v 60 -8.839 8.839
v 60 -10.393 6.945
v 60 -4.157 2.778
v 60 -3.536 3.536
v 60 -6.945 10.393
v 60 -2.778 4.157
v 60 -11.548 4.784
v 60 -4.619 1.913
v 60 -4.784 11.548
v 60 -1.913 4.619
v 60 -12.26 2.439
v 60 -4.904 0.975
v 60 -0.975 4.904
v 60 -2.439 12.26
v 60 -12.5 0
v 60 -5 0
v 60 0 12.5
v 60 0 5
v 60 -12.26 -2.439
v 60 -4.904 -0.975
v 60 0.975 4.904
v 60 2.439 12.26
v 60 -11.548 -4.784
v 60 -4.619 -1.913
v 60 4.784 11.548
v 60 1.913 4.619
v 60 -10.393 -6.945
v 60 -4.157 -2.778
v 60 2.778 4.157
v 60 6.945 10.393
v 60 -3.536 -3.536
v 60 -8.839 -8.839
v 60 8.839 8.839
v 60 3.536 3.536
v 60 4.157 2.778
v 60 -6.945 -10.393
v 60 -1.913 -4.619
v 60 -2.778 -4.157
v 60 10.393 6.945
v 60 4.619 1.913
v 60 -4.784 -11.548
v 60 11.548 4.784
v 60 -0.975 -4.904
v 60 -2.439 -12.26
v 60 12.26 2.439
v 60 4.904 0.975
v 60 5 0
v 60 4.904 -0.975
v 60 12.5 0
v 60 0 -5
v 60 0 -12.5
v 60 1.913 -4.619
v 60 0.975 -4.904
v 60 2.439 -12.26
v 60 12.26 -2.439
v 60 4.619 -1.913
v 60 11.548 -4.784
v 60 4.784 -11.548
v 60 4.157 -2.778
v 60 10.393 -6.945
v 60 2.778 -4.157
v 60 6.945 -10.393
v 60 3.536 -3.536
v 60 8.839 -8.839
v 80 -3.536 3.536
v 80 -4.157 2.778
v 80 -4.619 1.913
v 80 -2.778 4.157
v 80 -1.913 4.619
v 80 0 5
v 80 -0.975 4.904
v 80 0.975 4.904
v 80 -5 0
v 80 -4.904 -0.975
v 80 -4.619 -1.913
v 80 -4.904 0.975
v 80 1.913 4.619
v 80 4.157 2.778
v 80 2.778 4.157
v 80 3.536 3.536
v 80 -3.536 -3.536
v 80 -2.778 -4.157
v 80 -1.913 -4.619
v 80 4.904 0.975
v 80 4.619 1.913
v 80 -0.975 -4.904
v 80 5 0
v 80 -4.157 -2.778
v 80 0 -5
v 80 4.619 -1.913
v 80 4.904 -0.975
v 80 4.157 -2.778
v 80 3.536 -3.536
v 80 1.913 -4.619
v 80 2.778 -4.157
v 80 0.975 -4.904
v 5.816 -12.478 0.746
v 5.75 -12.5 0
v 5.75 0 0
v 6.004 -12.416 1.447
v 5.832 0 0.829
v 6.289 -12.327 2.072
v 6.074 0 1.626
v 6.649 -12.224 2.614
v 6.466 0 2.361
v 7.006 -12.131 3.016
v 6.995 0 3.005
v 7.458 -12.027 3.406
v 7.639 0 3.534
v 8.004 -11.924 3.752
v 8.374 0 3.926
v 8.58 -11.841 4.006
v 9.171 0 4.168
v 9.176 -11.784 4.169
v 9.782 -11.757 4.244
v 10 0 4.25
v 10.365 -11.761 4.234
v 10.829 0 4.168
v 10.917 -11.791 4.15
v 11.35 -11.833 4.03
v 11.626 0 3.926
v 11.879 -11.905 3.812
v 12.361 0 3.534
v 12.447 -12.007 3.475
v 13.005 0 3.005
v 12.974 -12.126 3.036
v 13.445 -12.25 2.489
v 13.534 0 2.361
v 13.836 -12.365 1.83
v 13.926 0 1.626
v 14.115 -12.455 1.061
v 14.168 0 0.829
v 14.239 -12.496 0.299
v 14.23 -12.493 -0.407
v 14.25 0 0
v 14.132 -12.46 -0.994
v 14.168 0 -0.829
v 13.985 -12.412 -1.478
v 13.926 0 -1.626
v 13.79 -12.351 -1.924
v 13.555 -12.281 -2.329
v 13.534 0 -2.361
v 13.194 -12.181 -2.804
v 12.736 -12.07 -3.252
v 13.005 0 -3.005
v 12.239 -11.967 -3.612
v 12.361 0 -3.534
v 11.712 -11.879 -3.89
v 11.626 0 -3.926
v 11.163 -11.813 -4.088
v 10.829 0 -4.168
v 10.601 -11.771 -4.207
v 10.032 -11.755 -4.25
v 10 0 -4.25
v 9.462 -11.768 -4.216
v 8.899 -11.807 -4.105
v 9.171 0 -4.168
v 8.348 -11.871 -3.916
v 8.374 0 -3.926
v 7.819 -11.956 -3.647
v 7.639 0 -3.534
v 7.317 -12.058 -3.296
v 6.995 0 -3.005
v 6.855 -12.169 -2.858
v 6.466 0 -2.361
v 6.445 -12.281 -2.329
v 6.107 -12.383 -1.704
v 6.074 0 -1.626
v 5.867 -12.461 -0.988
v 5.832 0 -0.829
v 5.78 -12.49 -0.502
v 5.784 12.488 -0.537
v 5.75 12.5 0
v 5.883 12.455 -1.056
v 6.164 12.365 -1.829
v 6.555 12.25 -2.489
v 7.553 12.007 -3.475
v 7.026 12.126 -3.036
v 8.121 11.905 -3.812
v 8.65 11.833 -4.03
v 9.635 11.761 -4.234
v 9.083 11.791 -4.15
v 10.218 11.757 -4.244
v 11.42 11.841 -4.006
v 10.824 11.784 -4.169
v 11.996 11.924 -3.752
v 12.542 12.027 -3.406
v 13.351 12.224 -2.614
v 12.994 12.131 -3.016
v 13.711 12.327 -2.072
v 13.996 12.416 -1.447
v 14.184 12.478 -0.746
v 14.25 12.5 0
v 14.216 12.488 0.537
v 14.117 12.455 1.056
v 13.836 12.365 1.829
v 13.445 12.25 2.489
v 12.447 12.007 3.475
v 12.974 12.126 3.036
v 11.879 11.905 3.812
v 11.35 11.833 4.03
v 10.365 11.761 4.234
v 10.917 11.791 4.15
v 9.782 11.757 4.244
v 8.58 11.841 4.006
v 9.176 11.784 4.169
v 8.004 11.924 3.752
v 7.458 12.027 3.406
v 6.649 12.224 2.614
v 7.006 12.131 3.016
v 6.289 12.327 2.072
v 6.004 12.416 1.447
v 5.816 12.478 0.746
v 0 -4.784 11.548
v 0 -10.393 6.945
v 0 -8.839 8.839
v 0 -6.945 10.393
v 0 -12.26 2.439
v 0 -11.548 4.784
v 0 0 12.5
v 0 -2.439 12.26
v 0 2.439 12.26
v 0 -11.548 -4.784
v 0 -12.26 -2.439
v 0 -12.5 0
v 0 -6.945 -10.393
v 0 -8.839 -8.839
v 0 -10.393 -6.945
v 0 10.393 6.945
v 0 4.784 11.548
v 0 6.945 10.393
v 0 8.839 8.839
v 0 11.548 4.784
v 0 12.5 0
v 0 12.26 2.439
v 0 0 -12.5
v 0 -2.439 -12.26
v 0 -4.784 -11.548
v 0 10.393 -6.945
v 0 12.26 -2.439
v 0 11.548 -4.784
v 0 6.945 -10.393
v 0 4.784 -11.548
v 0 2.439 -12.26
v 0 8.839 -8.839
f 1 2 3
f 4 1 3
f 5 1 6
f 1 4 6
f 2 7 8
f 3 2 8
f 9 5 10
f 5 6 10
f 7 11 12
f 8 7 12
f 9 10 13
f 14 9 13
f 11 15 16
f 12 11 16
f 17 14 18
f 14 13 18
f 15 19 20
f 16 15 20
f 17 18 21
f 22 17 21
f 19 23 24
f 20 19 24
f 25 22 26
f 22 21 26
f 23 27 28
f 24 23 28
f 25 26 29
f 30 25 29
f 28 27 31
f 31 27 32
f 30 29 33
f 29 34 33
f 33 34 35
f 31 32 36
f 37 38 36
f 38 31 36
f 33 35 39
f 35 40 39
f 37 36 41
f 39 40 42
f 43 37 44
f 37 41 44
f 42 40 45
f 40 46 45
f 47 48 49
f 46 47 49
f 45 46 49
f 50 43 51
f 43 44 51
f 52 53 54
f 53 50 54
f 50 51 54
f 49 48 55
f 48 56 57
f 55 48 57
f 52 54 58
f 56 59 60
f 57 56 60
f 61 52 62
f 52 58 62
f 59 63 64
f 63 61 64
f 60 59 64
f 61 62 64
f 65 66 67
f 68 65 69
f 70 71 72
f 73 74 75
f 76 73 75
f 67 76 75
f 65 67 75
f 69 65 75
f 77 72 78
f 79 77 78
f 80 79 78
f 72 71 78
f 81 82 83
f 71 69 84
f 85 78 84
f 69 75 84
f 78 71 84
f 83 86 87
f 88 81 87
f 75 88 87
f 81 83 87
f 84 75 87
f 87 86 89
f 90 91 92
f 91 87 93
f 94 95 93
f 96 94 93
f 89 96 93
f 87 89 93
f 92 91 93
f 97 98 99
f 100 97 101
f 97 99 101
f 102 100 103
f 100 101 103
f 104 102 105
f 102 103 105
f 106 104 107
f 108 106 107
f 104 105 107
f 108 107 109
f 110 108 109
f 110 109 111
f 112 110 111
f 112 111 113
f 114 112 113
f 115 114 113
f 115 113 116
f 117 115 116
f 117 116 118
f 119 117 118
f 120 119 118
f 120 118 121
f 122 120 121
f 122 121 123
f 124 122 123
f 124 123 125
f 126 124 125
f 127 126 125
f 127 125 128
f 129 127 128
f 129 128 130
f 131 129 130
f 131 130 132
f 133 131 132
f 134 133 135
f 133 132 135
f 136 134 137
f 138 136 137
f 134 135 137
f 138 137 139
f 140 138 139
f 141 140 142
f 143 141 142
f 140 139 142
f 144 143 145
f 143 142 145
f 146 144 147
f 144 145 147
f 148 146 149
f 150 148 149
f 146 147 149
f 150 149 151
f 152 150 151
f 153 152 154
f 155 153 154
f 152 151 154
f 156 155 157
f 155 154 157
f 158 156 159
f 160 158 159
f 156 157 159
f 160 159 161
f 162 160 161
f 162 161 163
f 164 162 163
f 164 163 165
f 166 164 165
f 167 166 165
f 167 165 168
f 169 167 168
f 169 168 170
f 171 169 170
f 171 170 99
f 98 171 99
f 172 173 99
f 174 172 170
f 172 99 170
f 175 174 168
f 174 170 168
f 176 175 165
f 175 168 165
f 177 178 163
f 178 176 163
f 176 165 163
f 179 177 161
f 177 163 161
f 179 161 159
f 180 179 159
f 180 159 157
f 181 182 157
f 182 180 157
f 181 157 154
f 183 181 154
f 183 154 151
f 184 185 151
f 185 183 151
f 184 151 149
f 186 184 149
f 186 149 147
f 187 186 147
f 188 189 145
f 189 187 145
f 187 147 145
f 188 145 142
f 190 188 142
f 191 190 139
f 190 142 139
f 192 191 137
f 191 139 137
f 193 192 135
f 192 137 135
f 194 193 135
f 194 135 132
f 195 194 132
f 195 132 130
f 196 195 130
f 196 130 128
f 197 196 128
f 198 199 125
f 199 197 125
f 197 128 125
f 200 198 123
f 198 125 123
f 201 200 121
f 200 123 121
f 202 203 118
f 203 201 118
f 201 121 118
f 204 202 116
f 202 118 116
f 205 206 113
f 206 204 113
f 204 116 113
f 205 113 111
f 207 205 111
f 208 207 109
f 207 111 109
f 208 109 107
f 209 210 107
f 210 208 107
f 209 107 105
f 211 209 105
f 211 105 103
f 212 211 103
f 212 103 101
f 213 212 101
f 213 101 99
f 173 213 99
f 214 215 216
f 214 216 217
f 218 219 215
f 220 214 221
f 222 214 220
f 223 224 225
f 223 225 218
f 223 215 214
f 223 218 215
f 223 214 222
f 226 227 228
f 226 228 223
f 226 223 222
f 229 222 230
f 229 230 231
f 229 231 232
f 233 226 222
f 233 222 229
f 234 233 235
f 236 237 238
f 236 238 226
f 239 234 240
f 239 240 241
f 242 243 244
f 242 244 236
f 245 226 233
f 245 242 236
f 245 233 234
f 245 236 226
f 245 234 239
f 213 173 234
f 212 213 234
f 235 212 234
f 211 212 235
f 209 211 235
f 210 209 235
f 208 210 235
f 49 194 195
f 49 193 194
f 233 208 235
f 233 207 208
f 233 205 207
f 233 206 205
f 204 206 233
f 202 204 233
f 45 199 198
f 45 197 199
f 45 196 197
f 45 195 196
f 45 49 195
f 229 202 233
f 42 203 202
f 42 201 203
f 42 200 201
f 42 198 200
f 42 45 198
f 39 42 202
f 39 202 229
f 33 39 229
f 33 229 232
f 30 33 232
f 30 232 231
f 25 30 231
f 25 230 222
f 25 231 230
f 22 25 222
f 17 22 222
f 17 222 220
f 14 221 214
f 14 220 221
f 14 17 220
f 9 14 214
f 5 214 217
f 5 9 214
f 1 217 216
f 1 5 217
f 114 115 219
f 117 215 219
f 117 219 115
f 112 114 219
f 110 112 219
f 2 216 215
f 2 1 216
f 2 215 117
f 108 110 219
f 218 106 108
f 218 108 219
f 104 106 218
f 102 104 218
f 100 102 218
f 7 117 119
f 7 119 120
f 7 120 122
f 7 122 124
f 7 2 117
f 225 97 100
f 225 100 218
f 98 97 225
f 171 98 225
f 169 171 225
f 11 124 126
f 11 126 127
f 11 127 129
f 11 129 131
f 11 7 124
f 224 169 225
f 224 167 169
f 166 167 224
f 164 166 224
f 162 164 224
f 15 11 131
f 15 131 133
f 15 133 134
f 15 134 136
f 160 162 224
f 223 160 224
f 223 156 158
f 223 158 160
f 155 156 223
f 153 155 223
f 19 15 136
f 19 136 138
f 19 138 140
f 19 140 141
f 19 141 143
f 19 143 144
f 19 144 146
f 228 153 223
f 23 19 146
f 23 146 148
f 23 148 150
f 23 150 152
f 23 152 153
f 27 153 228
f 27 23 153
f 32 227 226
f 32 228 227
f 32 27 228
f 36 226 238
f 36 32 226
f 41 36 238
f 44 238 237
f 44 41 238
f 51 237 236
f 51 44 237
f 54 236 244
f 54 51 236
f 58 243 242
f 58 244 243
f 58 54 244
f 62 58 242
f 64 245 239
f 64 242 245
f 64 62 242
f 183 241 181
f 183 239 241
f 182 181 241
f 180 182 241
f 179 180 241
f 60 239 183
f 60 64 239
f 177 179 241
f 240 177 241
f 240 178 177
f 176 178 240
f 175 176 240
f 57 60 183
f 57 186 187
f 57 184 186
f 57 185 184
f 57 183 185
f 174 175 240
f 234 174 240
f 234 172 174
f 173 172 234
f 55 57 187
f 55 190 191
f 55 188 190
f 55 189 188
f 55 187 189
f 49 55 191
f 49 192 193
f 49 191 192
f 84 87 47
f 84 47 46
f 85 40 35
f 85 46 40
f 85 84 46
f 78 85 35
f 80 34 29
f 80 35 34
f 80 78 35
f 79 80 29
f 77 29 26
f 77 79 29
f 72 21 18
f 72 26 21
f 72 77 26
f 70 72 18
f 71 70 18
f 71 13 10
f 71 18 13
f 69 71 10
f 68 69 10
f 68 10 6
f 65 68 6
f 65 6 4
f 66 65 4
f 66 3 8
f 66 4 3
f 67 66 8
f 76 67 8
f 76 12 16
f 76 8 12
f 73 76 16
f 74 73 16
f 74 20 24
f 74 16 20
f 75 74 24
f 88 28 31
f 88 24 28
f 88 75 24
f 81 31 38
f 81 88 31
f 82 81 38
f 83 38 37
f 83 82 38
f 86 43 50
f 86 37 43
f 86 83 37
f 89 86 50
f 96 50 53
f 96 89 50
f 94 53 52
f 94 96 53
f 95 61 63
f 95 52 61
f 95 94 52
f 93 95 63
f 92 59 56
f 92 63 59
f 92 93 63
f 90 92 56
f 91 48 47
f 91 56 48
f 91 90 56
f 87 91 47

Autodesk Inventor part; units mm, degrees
ref_plane "YZ Plane" through (0, 0, 0) normal (1, 0, 0) x (0, 1, 0)
ref_plane "XZ Plane" through (0, 0, 0) normal (0, 1, 0) x (-1, 0, 0)
ref_plane "XY Plane" through (0, 0, 0) normal (0, 0, 1) x (1, 0, 0)
sketch "Boceto3" plane through (0, 0, 0) normal (0, 0, 1) x (1, 0, 0)
  line L0 (0, 0) -> (0, 12.5)
  line L1 (0, 12.5) -> (60, 12.5)
  line L2 (60, 12.5) -> (60, 5)
  line L3 (60, 5) -> (80, 5)
  line L4 (80, 5) -> (80, 0)
  line L5 (80, 0) -> (0, 0)
  dimension "d16" = 12.5
  dimension "d17" = 60
  dimension "d18" = 20
  dimension "d19" = 5
revolve "Revolución1" add sketch "Boceto3" angle 360 about axis through (80, 0, 0) along (-1, 0, 0)
sketch "Boceto4" plane through (0, 0, 0) normal (0, 1, 0) x (-1, 0, 0)
  circle A0 centre (-10, 0) radius 4.25
  line L0 (-60, 12.5) -> (-60, -12.5) projected
  point P0 (0, 0)
  dimension "d21" = 8.5
  dimension "d22" = 50
extrude "Extrusión3" cut sketch "Boceto4" along normal through all both and the other way through all
thread "Rosca3" size "M10x1.5" class "6H" standard "ANSI Metric M Profile" full length
thread "Rosca4" size "M10x1.5" class "6g" standard "ANSI Metric M Profile" full length
properties part number "brazos_planetarios1" material "Nilón 6/6"
